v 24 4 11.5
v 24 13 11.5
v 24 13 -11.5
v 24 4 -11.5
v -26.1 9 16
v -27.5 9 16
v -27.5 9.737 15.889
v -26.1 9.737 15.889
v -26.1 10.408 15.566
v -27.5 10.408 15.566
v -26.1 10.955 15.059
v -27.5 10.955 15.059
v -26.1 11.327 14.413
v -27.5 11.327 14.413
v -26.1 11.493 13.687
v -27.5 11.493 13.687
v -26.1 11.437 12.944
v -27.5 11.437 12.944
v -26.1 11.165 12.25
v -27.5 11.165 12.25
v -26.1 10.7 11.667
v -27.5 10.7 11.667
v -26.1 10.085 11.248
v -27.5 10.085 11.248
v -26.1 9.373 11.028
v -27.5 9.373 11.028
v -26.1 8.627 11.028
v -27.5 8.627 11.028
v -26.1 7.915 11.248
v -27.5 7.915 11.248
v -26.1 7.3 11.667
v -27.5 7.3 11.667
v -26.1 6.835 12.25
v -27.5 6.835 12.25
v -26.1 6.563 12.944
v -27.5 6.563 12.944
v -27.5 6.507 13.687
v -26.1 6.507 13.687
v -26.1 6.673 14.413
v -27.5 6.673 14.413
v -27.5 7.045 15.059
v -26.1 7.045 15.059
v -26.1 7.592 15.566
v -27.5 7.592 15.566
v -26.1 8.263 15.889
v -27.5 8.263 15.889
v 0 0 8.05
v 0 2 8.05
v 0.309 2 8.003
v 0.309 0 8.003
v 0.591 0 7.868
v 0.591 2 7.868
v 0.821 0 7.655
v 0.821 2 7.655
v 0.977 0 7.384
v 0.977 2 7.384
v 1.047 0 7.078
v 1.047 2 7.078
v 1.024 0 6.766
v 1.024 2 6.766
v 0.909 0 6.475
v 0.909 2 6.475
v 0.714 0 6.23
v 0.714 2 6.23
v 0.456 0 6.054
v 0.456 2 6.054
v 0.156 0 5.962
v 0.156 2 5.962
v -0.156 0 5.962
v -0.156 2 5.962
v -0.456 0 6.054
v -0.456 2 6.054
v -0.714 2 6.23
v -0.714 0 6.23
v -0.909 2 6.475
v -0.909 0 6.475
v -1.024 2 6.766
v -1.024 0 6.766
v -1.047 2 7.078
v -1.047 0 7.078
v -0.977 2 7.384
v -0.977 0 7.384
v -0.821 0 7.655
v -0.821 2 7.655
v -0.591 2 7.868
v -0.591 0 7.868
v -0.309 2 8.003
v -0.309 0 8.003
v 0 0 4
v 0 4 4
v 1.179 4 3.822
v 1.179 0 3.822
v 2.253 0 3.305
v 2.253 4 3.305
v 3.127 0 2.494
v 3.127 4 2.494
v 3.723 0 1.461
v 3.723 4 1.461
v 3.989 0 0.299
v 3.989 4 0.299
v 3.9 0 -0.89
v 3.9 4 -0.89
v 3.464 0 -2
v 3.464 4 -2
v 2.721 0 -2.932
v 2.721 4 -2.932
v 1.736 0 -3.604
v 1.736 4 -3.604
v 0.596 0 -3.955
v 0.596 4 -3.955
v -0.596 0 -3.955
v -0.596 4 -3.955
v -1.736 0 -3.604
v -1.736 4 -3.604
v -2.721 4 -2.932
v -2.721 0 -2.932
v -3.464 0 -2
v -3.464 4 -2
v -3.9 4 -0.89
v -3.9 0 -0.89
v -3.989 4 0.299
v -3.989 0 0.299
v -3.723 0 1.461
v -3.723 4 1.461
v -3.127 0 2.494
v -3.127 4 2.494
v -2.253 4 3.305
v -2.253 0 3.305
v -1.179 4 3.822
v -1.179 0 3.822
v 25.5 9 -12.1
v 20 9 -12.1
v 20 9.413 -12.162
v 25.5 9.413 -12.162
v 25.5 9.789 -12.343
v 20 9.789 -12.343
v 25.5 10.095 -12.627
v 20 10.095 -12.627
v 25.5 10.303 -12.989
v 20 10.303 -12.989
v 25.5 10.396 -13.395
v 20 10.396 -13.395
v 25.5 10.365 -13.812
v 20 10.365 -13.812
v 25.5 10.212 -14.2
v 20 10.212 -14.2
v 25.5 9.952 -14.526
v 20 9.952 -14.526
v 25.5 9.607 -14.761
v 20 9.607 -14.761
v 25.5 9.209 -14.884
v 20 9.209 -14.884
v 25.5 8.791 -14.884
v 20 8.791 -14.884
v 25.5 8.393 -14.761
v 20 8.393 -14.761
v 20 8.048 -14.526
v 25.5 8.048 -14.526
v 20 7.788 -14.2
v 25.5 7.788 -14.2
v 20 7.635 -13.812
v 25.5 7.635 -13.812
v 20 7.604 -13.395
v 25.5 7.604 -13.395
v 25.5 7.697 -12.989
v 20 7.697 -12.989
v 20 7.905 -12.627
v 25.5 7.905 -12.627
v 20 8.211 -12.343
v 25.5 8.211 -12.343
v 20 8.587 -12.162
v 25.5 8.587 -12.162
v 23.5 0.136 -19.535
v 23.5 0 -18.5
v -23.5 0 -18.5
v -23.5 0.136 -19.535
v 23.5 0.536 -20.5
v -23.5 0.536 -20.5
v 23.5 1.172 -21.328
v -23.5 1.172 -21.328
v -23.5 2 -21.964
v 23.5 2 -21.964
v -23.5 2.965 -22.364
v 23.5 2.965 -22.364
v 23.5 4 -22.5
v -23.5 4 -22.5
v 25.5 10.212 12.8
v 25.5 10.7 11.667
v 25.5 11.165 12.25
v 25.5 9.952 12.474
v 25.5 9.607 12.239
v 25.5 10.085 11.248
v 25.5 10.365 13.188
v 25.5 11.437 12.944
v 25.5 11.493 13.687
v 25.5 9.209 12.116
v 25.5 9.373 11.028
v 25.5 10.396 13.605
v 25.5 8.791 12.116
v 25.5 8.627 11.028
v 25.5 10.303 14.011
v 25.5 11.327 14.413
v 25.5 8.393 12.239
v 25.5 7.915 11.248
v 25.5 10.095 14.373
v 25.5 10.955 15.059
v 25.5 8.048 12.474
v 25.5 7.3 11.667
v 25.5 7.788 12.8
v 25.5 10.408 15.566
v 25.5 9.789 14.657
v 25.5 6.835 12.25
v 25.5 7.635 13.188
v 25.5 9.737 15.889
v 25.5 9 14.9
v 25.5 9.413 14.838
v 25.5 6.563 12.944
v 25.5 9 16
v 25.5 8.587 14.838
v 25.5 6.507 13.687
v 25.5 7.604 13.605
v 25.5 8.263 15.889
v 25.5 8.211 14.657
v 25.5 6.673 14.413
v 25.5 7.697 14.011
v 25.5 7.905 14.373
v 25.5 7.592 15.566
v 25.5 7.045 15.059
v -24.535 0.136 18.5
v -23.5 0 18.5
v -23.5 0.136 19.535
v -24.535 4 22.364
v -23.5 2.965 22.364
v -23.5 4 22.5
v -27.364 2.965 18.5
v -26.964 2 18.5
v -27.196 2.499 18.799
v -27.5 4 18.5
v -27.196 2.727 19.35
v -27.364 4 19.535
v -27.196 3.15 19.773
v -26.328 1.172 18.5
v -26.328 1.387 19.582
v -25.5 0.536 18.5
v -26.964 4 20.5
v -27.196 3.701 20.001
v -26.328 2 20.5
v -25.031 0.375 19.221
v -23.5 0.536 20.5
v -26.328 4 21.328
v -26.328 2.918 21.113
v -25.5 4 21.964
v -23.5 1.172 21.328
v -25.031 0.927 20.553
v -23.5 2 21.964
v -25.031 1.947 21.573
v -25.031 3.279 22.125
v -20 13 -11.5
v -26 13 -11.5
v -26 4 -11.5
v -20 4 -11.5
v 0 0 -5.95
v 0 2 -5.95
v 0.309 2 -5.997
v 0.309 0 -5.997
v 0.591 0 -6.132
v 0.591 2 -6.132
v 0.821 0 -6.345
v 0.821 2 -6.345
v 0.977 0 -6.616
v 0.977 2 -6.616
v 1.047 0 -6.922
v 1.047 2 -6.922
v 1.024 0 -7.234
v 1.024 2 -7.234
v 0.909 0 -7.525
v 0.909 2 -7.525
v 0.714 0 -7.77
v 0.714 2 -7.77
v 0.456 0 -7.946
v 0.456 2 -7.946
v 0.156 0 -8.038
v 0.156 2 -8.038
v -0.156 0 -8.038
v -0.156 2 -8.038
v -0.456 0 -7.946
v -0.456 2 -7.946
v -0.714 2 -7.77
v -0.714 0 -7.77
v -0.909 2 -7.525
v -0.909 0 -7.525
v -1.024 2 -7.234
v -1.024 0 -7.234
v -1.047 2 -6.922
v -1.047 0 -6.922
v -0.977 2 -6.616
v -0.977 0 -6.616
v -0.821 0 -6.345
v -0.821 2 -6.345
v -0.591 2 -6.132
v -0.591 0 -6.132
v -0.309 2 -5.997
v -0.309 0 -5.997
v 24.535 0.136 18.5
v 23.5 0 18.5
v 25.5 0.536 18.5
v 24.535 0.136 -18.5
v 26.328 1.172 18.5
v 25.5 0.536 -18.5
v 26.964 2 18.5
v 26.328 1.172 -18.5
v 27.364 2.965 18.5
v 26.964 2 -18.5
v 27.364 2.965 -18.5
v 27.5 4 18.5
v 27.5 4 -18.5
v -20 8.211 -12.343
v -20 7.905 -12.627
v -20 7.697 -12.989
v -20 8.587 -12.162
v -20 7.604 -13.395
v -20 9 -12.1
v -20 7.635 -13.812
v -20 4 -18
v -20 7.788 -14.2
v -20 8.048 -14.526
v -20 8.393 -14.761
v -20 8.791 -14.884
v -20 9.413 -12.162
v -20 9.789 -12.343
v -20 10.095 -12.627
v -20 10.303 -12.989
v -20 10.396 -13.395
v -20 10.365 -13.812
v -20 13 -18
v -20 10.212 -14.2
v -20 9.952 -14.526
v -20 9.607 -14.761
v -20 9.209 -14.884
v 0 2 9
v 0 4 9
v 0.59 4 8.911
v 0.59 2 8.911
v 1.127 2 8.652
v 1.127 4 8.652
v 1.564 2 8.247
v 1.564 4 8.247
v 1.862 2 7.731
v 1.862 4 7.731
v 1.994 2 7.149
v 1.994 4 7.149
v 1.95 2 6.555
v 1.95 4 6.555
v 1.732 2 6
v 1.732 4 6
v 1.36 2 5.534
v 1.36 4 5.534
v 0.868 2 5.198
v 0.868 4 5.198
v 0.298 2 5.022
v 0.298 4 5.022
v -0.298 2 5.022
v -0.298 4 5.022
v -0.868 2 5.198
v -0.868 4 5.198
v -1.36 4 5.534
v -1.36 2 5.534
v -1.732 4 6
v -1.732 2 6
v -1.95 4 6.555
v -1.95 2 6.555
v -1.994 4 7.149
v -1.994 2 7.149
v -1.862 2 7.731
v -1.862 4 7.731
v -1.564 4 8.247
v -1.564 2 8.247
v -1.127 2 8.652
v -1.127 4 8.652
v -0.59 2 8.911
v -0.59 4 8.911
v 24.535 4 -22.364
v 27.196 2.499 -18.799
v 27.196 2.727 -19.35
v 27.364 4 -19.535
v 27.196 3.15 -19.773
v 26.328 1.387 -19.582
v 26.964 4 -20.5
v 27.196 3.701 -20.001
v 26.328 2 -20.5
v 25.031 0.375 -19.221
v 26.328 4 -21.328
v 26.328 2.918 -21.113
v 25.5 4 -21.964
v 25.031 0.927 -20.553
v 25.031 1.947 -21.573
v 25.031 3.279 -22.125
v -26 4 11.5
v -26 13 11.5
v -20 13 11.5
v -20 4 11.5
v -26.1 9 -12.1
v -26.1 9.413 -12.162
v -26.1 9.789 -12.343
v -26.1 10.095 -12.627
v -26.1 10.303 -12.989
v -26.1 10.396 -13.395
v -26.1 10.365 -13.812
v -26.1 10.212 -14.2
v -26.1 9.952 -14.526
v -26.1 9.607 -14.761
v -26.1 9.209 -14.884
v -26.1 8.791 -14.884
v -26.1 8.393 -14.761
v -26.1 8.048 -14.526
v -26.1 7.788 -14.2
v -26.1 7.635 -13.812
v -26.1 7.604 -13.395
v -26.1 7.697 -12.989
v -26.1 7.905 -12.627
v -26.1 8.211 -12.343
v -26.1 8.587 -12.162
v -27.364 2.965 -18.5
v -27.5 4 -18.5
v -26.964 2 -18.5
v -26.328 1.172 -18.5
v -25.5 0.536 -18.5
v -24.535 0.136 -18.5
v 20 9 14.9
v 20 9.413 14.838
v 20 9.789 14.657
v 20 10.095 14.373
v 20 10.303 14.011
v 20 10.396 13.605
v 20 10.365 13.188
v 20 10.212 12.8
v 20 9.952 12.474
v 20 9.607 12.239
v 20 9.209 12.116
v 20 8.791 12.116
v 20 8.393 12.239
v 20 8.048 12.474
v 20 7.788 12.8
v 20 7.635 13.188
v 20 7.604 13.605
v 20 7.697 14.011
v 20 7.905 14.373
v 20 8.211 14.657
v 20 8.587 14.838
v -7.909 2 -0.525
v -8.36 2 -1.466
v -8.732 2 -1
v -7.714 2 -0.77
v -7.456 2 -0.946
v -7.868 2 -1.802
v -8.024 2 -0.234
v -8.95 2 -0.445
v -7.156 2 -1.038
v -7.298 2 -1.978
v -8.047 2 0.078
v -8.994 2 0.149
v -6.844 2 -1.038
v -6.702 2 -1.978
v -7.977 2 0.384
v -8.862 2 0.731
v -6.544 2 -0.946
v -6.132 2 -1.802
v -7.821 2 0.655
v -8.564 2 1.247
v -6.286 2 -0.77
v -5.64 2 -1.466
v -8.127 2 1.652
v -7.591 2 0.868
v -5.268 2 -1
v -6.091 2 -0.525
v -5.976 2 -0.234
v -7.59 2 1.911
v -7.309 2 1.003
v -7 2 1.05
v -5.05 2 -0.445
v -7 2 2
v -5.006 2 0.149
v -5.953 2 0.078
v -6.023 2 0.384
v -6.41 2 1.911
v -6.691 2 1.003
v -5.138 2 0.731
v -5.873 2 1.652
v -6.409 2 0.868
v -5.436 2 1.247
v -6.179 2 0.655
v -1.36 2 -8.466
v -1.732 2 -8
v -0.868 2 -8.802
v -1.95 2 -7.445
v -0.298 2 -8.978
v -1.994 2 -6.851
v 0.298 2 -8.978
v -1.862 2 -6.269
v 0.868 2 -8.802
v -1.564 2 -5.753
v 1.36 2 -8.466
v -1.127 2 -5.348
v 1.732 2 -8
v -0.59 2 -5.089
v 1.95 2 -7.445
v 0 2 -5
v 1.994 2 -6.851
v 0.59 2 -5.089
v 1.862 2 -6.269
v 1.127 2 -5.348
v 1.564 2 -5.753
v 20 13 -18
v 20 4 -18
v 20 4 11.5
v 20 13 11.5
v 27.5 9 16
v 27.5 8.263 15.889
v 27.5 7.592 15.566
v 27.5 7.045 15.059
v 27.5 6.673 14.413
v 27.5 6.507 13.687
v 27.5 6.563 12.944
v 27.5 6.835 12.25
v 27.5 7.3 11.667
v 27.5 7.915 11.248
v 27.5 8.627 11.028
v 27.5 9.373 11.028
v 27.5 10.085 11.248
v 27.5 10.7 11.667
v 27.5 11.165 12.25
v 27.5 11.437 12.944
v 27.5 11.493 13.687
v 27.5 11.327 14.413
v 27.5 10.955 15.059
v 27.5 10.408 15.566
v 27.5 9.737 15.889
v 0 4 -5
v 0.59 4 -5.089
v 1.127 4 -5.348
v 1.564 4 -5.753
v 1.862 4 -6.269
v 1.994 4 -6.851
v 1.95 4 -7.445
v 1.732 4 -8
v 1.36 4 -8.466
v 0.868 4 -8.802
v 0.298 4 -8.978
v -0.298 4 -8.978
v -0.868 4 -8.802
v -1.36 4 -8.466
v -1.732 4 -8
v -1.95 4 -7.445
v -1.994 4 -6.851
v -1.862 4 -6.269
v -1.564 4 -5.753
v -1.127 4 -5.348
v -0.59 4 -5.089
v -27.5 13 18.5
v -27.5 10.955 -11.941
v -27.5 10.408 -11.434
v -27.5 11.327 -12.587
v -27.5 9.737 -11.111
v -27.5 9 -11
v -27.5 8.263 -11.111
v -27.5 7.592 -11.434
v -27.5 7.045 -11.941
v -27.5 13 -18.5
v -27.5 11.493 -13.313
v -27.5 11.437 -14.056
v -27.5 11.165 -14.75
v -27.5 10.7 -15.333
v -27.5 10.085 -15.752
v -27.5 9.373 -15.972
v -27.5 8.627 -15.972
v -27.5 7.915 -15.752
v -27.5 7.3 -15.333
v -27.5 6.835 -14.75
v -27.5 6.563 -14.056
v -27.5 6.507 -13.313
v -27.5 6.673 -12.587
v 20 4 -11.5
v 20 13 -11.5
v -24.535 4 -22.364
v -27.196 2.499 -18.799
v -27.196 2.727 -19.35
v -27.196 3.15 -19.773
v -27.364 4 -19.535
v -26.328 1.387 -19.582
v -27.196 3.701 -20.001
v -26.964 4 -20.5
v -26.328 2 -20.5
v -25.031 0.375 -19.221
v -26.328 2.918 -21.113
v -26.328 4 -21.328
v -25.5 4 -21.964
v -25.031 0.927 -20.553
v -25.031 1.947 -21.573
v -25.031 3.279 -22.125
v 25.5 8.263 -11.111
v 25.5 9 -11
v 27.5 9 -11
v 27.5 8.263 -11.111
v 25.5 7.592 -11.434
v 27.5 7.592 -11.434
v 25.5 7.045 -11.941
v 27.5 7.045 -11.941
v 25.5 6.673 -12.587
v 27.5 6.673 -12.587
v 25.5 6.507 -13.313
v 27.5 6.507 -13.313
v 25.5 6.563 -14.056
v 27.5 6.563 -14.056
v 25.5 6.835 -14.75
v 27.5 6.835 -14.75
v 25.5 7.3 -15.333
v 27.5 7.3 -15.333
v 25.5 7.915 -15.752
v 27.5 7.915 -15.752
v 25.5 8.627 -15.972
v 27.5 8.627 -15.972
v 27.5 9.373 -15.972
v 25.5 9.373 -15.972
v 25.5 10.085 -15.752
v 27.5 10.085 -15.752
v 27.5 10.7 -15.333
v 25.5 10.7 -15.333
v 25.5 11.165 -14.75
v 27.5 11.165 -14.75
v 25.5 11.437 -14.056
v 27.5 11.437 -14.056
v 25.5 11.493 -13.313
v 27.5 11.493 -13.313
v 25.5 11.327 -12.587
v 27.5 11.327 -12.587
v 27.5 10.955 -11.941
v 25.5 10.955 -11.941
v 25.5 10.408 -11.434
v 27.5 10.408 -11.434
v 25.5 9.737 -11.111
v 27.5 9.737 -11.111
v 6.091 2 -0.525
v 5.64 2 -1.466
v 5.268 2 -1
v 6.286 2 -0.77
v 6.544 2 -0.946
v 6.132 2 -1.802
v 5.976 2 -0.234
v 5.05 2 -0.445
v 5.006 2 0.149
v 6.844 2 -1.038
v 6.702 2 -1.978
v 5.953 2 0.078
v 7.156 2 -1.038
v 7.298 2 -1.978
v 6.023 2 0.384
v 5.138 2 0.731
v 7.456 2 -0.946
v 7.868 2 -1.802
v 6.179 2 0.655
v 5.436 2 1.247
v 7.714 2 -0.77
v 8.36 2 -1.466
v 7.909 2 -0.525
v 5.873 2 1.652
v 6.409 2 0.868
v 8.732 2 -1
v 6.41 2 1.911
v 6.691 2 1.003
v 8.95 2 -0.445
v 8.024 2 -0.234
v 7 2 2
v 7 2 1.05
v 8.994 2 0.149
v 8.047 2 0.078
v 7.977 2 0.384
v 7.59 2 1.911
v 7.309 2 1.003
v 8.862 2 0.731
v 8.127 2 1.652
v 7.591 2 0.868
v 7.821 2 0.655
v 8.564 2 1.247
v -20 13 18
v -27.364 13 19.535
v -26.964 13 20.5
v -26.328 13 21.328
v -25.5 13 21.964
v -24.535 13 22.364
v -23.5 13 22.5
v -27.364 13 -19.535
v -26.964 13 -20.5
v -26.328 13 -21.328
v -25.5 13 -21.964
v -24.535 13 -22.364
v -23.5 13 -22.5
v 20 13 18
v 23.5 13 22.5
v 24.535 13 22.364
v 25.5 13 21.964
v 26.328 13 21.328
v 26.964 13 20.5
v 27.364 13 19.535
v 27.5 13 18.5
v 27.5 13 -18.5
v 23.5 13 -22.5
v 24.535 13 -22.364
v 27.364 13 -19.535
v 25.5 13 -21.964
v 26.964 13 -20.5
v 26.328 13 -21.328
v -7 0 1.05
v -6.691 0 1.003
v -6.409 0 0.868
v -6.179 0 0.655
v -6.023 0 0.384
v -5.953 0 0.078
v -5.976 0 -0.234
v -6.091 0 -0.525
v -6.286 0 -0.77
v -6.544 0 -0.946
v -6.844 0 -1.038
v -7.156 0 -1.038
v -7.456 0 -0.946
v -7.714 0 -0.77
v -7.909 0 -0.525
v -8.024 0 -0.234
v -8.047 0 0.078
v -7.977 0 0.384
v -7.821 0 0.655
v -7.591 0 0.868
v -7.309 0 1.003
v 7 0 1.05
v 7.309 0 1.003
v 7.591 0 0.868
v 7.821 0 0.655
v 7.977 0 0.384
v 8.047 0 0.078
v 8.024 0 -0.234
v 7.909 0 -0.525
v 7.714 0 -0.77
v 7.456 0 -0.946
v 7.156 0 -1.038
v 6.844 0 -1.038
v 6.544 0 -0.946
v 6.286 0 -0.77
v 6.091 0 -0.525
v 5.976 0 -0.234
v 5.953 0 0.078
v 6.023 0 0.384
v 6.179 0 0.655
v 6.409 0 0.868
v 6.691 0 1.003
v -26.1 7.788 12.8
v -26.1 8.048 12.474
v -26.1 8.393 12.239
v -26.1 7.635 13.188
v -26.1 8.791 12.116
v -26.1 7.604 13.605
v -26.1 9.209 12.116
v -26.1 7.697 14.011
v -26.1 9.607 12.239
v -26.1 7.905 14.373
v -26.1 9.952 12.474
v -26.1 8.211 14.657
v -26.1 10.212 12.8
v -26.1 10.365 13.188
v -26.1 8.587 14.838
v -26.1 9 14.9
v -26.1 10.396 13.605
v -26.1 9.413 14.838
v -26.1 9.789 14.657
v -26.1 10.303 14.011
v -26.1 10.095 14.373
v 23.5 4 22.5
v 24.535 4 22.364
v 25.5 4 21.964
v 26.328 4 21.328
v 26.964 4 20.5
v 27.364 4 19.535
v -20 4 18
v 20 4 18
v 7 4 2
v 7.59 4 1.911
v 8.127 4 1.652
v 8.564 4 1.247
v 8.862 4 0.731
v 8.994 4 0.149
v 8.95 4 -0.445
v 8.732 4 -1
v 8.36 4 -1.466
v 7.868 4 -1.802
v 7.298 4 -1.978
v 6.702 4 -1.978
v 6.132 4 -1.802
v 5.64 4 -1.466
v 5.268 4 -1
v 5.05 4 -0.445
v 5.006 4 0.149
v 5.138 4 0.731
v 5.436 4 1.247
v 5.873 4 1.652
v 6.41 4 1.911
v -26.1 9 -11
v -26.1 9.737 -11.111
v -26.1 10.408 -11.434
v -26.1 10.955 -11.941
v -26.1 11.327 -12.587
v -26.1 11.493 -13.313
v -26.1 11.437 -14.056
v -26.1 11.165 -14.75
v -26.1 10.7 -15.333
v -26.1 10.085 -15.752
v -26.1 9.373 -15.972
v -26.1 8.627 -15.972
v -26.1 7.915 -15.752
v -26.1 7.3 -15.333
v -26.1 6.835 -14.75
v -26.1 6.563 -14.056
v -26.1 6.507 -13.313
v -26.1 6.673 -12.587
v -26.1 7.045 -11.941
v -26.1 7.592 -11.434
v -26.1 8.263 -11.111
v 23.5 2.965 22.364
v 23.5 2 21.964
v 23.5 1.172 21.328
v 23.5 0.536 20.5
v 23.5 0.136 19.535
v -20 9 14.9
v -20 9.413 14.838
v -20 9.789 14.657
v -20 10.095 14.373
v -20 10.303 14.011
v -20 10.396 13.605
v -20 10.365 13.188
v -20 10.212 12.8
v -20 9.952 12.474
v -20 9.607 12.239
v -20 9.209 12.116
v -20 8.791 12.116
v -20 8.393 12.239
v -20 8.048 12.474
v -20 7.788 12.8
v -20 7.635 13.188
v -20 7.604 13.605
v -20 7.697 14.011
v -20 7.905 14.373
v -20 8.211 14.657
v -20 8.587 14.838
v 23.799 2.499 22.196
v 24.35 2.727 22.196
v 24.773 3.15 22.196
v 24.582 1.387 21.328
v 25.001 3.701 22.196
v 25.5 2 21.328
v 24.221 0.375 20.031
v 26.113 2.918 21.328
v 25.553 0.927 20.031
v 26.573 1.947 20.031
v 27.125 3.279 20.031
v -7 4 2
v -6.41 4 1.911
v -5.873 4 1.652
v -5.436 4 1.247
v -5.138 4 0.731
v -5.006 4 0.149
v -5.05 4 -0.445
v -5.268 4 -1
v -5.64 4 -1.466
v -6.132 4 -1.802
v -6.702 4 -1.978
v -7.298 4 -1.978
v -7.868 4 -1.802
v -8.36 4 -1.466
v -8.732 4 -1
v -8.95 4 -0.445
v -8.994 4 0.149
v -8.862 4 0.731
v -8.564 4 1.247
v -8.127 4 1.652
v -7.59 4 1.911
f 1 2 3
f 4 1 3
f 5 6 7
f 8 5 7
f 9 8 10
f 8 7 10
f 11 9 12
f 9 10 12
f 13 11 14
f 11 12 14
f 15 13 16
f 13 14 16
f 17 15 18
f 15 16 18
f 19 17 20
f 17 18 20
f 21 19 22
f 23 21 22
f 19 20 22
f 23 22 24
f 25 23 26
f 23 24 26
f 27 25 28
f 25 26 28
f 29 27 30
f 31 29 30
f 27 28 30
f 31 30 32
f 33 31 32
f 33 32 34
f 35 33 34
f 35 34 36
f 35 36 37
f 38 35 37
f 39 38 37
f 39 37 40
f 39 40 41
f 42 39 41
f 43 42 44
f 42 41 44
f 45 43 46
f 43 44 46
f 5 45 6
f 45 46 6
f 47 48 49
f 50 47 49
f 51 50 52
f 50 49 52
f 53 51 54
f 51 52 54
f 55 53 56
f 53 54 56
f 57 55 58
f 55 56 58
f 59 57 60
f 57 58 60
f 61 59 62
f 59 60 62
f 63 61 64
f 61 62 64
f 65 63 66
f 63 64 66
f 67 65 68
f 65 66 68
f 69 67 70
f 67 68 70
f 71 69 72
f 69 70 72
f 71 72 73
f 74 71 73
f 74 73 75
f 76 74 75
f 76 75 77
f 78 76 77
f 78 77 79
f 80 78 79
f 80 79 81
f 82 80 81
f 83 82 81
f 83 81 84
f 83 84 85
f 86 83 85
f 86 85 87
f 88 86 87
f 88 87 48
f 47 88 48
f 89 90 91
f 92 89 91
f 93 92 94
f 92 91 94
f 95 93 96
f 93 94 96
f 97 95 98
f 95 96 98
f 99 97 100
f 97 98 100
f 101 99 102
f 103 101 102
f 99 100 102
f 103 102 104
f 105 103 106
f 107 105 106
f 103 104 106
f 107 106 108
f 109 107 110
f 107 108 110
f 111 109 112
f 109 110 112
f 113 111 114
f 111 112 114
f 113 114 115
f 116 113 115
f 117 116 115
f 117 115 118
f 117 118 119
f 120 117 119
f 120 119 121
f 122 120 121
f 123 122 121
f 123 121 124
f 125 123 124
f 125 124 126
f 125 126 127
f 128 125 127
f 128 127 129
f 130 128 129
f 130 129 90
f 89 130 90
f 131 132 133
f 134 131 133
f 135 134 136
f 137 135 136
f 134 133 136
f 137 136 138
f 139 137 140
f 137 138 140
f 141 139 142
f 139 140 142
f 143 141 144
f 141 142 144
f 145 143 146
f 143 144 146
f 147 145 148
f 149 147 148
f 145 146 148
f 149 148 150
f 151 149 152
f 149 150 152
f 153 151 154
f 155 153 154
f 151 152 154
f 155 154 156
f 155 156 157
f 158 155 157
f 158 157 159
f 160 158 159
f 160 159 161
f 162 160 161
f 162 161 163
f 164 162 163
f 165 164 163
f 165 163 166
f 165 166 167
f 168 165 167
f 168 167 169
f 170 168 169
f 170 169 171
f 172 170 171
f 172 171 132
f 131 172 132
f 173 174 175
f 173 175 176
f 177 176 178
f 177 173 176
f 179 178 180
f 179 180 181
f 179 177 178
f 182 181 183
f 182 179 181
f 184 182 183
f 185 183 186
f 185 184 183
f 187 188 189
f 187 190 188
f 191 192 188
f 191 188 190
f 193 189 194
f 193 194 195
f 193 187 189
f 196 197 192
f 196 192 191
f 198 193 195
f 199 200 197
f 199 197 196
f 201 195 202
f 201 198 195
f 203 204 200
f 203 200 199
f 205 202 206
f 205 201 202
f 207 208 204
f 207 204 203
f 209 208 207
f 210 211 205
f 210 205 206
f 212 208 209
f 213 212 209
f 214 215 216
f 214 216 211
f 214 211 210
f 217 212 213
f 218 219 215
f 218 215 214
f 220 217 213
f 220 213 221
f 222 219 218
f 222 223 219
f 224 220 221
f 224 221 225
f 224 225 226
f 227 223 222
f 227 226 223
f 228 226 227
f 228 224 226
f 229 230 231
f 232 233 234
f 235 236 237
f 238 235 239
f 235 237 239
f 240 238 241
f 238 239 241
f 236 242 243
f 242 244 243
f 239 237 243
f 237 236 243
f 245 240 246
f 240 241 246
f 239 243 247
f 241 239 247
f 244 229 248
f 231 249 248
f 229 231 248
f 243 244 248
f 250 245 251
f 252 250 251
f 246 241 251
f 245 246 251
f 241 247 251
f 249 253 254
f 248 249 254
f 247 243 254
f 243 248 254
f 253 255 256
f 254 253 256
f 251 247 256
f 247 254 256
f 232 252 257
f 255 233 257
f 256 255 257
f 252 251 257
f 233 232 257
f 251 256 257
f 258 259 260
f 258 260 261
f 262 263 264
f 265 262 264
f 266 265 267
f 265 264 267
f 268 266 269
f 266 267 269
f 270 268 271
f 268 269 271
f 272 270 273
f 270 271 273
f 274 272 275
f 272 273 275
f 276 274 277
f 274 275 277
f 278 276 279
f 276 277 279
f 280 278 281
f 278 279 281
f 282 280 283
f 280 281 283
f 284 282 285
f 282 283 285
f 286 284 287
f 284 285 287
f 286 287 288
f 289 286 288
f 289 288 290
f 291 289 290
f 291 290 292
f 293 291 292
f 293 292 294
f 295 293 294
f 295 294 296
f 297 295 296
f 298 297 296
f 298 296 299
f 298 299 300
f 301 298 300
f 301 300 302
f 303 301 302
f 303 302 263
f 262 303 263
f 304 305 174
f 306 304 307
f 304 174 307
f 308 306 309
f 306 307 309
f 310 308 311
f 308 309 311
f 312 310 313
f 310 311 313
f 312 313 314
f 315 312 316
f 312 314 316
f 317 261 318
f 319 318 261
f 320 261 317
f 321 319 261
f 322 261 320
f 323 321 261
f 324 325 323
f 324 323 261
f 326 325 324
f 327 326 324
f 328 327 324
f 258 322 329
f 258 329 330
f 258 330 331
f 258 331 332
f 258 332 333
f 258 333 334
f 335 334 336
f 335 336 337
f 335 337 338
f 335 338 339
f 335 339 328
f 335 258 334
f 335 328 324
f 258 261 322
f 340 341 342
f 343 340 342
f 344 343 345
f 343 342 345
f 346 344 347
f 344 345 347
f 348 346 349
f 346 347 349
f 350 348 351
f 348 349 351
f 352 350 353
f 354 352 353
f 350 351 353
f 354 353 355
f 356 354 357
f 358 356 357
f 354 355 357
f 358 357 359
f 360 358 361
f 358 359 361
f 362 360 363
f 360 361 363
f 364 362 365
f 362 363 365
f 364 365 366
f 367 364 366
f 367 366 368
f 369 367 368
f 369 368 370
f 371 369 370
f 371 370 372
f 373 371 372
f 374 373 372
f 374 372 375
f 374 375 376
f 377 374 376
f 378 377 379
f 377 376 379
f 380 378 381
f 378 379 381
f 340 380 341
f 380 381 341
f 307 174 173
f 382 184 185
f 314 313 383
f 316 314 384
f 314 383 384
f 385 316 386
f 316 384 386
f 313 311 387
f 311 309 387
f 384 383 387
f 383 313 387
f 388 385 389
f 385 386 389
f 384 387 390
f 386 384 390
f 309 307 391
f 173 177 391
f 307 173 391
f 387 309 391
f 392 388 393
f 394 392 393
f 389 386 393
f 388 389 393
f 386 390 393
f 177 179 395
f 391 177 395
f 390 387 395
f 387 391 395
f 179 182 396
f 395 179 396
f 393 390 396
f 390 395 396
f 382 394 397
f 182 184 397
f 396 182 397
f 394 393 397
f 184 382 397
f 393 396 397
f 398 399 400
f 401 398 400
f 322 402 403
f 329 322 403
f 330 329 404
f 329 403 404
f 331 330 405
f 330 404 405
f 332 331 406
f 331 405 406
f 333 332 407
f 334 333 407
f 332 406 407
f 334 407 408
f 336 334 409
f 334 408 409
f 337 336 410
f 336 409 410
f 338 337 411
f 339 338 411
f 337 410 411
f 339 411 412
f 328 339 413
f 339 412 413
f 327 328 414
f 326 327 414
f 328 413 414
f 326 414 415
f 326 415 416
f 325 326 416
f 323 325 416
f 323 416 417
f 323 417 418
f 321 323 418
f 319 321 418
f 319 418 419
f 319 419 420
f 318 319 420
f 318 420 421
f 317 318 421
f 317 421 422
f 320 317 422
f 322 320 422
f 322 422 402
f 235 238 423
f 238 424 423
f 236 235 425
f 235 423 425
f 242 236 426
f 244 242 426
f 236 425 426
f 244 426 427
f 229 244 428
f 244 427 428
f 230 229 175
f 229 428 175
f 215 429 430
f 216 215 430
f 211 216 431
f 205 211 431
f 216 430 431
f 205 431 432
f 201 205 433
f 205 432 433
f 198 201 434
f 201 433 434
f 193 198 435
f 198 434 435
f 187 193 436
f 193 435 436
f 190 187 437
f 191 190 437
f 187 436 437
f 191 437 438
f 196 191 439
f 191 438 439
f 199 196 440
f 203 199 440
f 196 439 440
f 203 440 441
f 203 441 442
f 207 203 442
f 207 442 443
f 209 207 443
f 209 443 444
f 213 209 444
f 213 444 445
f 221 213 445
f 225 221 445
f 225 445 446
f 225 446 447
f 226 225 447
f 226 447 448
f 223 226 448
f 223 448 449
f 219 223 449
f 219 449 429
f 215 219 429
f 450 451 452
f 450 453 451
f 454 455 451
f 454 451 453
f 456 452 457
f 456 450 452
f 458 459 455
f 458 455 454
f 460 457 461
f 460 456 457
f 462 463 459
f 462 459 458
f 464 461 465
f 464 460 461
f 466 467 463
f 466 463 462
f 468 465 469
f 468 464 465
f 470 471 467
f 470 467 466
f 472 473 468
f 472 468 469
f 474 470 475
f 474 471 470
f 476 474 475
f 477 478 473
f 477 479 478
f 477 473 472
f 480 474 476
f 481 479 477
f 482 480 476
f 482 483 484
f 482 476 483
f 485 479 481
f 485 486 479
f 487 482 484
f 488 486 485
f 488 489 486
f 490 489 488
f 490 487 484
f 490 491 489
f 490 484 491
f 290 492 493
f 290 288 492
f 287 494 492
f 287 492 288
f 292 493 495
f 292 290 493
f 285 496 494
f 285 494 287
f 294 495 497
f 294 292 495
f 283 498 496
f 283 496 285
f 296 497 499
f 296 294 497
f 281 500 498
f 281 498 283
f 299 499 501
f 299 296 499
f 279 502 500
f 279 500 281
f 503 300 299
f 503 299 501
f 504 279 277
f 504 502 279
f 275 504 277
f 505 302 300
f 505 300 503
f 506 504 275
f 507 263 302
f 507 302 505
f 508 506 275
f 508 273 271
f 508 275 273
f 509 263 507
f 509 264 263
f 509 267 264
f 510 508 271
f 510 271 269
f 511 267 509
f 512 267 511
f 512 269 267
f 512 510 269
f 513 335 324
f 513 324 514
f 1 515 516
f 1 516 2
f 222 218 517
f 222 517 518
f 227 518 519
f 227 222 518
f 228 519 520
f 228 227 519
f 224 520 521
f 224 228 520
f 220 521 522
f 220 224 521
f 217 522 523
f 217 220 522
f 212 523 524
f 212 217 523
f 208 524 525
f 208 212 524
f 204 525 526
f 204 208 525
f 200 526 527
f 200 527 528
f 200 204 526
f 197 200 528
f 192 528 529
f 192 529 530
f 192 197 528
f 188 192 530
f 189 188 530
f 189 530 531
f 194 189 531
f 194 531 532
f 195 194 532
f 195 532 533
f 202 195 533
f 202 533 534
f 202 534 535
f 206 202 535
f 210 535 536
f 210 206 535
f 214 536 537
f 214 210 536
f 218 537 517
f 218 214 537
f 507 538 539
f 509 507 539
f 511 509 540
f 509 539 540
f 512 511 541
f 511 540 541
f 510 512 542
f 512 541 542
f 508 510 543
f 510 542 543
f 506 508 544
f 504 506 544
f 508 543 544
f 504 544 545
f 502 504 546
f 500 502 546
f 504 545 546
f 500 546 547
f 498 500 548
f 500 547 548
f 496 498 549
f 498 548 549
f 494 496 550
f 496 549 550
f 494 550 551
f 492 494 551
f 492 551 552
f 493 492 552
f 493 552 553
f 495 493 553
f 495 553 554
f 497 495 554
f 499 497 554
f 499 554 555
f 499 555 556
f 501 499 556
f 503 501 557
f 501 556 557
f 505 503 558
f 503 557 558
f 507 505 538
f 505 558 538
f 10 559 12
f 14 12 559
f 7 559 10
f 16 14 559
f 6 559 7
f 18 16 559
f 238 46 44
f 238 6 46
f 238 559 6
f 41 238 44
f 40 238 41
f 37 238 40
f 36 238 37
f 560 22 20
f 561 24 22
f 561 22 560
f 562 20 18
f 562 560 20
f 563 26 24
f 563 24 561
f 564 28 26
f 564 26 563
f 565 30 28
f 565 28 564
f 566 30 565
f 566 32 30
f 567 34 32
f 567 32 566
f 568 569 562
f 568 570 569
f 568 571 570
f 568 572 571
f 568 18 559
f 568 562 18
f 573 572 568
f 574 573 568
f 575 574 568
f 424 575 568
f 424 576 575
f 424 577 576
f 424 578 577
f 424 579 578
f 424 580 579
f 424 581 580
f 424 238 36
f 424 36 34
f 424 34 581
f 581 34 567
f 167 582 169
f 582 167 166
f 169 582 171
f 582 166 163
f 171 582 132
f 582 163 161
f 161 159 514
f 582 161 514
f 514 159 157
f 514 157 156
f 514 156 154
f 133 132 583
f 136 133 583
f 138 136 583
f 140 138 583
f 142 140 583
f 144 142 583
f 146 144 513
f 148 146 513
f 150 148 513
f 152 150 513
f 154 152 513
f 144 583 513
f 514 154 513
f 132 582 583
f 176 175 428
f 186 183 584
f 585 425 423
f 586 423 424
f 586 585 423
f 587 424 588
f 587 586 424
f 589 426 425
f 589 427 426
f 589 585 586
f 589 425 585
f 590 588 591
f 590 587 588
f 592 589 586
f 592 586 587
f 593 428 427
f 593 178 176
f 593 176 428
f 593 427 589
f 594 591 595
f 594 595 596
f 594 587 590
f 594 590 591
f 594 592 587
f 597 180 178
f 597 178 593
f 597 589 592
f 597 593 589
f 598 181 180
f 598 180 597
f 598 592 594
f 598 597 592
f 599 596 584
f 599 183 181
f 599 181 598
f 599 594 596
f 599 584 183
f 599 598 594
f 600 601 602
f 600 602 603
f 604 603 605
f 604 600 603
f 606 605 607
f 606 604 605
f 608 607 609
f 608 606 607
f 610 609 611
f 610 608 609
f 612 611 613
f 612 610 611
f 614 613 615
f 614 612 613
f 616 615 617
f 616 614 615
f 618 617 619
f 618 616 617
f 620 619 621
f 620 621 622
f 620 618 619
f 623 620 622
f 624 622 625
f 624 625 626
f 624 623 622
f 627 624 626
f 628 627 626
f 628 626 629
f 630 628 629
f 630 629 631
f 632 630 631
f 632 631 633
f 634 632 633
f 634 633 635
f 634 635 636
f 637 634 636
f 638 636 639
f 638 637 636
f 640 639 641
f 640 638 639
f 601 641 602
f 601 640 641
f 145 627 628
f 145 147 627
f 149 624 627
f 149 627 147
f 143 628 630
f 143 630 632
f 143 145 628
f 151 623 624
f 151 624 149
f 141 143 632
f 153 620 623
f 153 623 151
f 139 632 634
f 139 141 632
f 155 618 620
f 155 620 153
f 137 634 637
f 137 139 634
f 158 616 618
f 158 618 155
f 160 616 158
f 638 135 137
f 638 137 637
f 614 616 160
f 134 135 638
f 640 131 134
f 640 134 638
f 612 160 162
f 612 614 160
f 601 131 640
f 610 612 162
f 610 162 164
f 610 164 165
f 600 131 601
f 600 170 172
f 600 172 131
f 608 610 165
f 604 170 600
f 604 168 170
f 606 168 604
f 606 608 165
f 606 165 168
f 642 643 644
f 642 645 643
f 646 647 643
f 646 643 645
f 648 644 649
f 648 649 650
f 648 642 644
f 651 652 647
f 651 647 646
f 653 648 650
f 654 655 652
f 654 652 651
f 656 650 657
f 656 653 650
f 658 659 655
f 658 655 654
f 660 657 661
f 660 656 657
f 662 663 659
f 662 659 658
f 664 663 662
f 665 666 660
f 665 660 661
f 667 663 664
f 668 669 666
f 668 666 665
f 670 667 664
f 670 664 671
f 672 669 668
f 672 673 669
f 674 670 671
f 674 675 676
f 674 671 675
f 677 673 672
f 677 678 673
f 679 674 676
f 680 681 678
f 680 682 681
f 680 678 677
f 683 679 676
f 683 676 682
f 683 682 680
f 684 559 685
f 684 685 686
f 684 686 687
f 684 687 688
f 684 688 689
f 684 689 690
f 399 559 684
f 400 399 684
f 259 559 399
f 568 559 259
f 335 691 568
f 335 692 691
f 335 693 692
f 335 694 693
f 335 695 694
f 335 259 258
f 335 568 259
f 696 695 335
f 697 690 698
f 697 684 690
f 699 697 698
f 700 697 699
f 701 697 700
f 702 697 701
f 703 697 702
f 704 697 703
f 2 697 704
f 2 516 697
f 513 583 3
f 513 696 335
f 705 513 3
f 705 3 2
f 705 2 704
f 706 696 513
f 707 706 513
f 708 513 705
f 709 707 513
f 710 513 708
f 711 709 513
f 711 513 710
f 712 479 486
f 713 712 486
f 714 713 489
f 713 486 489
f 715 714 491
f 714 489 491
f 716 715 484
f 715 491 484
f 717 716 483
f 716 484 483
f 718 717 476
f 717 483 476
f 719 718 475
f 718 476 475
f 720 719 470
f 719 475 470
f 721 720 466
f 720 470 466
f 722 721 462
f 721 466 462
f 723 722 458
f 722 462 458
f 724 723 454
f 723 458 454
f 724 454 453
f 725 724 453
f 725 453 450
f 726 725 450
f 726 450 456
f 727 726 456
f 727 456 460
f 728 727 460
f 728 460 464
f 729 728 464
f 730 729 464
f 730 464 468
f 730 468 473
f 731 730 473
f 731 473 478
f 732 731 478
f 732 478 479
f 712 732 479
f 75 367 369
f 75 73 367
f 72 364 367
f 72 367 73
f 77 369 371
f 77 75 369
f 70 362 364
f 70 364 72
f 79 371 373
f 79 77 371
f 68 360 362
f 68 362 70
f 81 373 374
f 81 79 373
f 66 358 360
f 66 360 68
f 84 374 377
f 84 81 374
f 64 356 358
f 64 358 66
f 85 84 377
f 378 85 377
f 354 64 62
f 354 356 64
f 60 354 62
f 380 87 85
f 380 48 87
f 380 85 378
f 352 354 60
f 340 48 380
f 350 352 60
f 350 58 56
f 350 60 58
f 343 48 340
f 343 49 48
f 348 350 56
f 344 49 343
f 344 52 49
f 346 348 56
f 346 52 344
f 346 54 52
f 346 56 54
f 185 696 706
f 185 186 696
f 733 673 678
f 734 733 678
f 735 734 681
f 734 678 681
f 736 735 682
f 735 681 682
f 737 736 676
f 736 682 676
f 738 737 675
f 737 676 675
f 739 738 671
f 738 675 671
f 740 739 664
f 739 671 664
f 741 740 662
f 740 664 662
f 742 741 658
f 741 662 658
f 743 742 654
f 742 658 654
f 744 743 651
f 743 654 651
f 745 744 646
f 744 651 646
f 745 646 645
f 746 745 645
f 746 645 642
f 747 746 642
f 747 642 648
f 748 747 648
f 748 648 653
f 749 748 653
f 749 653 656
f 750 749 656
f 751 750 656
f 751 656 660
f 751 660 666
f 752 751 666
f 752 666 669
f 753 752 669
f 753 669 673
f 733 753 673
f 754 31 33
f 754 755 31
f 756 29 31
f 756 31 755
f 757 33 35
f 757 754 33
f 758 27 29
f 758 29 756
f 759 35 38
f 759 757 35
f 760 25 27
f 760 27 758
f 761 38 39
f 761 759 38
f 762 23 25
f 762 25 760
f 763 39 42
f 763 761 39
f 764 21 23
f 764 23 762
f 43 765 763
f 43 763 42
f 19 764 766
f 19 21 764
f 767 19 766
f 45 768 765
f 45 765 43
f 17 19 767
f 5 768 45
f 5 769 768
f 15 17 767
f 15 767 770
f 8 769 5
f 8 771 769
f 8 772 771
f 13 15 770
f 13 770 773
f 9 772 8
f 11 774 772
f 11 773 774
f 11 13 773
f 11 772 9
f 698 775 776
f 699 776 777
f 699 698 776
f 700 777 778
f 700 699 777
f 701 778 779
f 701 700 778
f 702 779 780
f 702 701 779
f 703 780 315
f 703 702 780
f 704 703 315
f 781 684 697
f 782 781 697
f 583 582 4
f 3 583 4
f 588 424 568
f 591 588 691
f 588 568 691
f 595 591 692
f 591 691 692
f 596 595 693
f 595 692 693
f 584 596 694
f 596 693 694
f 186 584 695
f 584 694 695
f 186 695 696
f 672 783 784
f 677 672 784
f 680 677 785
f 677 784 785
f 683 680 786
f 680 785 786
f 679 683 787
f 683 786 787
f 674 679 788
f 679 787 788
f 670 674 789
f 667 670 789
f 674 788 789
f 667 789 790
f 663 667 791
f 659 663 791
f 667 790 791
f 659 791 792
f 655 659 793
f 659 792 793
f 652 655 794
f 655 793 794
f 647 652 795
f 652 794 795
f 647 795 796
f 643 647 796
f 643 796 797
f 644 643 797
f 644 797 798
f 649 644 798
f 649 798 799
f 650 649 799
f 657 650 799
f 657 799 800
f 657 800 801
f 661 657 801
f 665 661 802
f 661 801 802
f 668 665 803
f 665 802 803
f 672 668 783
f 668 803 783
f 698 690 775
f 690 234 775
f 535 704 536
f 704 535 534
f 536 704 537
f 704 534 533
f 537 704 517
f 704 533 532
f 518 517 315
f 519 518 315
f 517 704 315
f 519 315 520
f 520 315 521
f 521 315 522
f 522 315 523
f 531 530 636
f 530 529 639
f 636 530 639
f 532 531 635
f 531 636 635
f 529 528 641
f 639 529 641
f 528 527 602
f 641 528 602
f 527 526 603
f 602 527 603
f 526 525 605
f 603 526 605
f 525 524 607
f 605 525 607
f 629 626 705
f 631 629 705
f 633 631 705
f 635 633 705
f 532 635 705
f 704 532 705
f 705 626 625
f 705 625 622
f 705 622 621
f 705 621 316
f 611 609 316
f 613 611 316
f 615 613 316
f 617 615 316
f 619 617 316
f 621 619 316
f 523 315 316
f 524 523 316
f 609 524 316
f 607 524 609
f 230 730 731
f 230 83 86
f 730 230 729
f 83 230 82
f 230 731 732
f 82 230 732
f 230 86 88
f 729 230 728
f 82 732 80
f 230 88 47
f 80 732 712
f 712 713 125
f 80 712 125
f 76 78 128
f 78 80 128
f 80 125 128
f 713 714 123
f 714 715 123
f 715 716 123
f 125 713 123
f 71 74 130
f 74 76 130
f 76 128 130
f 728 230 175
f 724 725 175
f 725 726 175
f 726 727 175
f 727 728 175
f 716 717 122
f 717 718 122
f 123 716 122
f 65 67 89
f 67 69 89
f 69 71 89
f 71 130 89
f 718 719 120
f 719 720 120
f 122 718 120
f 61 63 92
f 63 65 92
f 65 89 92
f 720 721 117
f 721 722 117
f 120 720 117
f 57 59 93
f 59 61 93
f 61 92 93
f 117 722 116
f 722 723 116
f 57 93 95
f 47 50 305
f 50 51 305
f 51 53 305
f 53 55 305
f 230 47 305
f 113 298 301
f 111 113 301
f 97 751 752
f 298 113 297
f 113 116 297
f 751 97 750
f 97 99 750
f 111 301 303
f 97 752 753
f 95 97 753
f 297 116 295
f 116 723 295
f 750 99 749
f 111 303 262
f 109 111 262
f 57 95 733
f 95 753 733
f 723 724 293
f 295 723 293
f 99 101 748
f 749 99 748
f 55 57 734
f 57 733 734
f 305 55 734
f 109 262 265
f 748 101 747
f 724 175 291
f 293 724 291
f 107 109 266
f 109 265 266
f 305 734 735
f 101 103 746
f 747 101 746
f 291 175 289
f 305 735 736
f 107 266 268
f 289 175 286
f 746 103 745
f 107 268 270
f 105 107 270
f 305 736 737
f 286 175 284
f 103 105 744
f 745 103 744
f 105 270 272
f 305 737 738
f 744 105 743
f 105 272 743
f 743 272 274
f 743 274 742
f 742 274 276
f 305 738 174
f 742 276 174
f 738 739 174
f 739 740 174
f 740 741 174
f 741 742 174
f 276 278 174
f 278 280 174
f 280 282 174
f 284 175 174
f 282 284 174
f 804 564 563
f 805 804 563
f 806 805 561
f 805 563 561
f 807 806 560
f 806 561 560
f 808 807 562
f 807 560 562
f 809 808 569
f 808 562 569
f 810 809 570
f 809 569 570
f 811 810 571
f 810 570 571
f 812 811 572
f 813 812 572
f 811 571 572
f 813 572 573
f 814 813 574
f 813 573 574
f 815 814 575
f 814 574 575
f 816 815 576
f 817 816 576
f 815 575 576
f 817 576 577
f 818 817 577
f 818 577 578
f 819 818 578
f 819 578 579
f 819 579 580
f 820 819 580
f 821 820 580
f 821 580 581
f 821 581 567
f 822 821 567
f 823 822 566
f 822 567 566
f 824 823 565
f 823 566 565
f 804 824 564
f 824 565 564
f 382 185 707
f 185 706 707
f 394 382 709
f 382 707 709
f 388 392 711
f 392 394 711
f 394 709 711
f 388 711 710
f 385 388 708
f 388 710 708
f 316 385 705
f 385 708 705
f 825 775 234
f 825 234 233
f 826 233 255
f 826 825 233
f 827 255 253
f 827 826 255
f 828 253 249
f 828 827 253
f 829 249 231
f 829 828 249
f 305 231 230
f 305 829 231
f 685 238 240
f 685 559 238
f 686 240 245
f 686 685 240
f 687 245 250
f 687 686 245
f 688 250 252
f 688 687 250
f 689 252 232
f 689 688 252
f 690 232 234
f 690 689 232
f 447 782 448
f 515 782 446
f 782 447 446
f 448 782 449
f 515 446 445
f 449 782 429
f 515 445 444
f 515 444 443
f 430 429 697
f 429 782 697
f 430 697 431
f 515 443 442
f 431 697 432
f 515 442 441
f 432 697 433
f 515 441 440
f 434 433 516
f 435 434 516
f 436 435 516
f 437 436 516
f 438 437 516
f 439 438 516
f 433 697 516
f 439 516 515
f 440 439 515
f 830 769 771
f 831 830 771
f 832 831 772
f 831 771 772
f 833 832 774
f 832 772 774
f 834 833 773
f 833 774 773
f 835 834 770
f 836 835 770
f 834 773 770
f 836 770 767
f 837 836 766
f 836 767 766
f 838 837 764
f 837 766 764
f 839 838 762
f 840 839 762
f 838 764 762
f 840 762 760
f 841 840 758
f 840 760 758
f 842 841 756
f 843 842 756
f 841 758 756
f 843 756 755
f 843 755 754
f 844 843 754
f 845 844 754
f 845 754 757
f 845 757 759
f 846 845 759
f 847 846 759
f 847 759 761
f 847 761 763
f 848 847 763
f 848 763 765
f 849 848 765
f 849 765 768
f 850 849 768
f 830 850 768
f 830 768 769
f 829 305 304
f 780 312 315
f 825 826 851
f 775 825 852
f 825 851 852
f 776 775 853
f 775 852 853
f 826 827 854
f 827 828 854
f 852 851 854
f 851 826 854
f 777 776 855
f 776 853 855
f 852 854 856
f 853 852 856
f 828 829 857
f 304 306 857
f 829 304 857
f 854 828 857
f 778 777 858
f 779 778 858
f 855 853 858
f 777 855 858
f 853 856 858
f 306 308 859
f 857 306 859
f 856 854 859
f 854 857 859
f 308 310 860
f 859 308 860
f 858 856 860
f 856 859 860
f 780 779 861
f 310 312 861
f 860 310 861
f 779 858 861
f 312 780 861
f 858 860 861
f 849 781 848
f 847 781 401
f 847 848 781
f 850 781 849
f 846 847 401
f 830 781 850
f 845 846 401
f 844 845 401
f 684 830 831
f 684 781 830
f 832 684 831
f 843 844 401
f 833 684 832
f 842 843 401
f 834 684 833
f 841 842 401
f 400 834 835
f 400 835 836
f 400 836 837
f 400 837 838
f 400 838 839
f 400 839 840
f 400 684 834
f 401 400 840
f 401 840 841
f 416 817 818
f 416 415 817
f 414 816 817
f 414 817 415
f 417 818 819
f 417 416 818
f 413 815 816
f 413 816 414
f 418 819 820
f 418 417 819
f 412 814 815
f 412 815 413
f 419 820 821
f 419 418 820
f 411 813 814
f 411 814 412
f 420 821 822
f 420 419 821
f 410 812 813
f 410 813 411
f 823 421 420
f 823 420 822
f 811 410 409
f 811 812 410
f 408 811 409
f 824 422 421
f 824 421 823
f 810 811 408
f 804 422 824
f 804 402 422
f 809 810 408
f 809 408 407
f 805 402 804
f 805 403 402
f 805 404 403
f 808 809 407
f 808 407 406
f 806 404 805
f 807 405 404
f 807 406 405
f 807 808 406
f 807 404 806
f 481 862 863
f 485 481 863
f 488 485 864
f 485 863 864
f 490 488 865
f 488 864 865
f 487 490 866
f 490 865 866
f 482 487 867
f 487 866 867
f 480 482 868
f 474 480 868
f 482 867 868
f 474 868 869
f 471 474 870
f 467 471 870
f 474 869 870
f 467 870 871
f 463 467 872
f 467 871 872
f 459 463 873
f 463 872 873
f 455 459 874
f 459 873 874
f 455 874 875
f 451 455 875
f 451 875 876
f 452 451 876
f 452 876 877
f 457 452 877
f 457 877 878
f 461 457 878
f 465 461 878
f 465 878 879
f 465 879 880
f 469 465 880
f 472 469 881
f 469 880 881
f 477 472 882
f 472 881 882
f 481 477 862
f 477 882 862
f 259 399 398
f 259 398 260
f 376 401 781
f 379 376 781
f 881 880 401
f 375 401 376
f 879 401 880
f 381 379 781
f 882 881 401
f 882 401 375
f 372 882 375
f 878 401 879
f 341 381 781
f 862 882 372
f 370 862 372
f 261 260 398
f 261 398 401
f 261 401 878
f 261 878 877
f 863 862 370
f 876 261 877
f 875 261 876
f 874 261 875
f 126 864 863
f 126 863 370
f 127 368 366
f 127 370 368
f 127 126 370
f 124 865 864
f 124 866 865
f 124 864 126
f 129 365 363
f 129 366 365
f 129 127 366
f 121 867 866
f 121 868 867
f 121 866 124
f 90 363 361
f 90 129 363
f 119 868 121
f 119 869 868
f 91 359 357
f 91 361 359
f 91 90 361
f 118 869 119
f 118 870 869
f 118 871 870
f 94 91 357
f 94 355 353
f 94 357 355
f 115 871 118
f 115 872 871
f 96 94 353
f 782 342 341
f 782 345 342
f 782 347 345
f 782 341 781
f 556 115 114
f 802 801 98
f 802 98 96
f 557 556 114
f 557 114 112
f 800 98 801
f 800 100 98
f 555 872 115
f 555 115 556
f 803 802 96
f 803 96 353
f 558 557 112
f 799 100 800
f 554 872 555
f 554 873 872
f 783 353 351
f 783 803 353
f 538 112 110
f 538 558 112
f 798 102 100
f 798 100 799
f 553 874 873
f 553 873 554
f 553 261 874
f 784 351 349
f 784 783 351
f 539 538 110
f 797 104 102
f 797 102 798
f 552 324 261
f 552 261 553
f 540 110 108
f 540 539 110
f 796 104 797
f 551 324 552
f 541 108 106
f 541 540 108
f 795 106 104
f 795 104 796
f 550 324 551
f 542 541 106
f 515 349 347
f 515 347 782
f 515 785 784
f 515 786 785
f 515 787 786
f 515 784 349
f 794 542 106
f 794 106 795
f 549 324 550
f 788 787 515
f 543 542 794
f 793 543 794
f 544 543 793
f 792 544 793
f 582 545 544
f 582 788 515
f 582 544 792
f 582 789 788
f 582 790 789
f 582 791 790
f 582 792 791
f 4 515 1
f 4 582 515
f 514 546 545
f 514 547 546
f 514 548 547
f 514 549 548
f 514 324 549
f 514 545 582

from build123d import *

# Parameters (mm, degrees)
SKETCH1_W           = 55
SKETCH1_H           = 45
BOSS_EXTRUDE1_DEPTH = 13
SKETCH2_W           = 40
SKETCH2_H           = 36
SKETCH2_W_2         = 6
SKETCH2_H_2         = 23
SKETCH2_W_3         = 4
CUT_EXTRUDE1_DEPTH  = 9
SKETCH3_R           = 1.4
CUT_EXTRUDE2_DEPTH  = 61.829680256
SKETCH4_R           = 1.05
SKETCH4_R_2         = 4
CUT_EXTRUDE3_DEPTH  = 37.653785616
SKETCH5_R           = 2
CUT_EXTRUDE4_DEPTH  = 2
SKETCH6_R           = 2.5
CUT_EXTRUDE5_DEPTH  = 1.4
CUT_EXTRUDE6_START  = -2
SKETCH7_R           = 2.5
CUT_EXTRUDE6_DEPTH  = 2
FILLET1_R           = 4


with BuildPart() as part:
    # Sketch1 → Boss-Extrude1 (new body)
    with BuildSketch(Plane(origin=(0, 0, 0), x_dir=(1, 0, 0), z_dir=(0, 1, 0))):
        Rectangle(SKETCH1_W, SKETCH1_H)
    extrude(amount=BOSS_EXTRUDE1_DEPTH)

    # Sketch2 → Cut-Extrude1 (cut)
    with BuildSketch(Plane(origin=(0, 13, 0), x_dir=(1, 0, 0), z_dir=(0, 1, 0))):
        Rectangle(SKETCH2_W, SKETCH2_H)
        with Locations((-23, 0)):
            Rectangle(SKETCH2_W_2, SKETCH2_H_2)
        with Locations((22, 0)):
            Rectangle(SKETCH2_W_3, SKETCH2_H_2)
    extrude(amount=-CUT_EXTRUDE1_DEPTH, mode=Mode.SUBTRACT)

    # Sketch3 → Cut-Extrude2 (cut, through all)
    with BuildSketch(Plane.ZY.offset(27.5)):
        with Locations((-13.5, 9)):
            Circle(SKETCH3_R)
        with Locations((13.5, 9)):
            Circle(SKETCH3_R)
    extrude(amount=-CUT_EXTRUDE2_DEPTH, mode=Mode.SUBTRACT)

    # Sketch4 → Cut-Extrude3 (cut, through all)
    with BuildSketch(Plane(origin=(0, 4, 0), x_dir=(1, 0, 0), z_dir=(0, 1, 0))):
        with Locations(Location((0, 7, 0), (0, 0, 270))):
            Circle(SKETCH4_R)
        with Locations(Location((7, 0, 0), (0, 0, 270))):
            Circle(SKETCH4_R)
        with Locations(Location((-7, 0, 0), (0, 0, 270))):
            Circle(SKETCH4_R)
        with Locations(Location((0, -7, 0), (0, 0, 270))):
            Circle(SKETCH4_R)
        with Locations(Location((0, 0, 0), (0, 0, 270))):
            Circle(SKETCH4_R_2)
    extrude(amount=-CUT_EXTRUDE3_DEPTH, mode=Mode.SUBTRACT)

    # Sketch5 → Cut-Extrude4 (cut)
    with BuildSketch(Plane(origin=(0, 4, 0), x_dir=(1, 0, 0), z_dir=(0, 1, 0))):
        with Locations(Location((-7, 0, 0), (0, 0, 270))):
            Circle(SKETCH5_R)
        with Locations(Location((0, 7, 0), (0, 0, 270))):
            Circle(SKETCH5_R)
        with Locations(Location((7, 0, 0), (0, 0, 270))):
            Circle(SKETCH5_R)
        with Locations(Location((0, -7, 0), (0, 0, 270))):
            Circle(SKETCH5_R)
    extrude(amount=-CUT_EXTRUDE4_DEPTH, mode=Mode.SUBTRACT)

    # Sketch6 → Cut-Extrude5 (cut)
    with BuildSketch(Plane.ZY.offset(27.5)):
        with Locations((-13.5, 9)):
            Circle(SKETCH6_R)
        with Locations((13.5, 9)):
            Circle(SKETCH6_R)
    extrude(amount=-CUT_EXTRUDE5_DEPTH, mode=Mode.SUBTRACT)

    # Sketch7 → Cut-Extrude6 (cut)
    with BuildSketch(Plane(origin=(27.5, 0, 0), x_dir=(0, 0, -1), z_dir=(1, 0, 0)).offset(CUT_EXTRUDE6_START)):
        with Locations(Location((-13.5, 9, 0), (0, 0, 180))):
            Circle(SKETCH7_R)
        with Locations(Location((13.5, 9, 0), (0, 0, 180))):
            Circle(SKETCH7_R)
    extrude(amount=CUT_EXTRUDE6_DEPTH, mode=Mode.SUBTRACT)

    # Fillet1
    fillet1_edges = [part.edges().sort_by_distance(p)[0] for p in [
        (0, 0, -22.5),
        (27.5, 0, 0),
        (0, 0, 22.5),
        (-27.5, 0, 0),
        (-27.5, 6.5, -22.5),
        (27.5, 6.5, -22.5),
        (27.5, 6.5, 22.5),
        (-27.5, 6.5, 22.5),
    ]]
    fillet(fillet1_edges, radius=FILLET1_R)


solid = part.part
